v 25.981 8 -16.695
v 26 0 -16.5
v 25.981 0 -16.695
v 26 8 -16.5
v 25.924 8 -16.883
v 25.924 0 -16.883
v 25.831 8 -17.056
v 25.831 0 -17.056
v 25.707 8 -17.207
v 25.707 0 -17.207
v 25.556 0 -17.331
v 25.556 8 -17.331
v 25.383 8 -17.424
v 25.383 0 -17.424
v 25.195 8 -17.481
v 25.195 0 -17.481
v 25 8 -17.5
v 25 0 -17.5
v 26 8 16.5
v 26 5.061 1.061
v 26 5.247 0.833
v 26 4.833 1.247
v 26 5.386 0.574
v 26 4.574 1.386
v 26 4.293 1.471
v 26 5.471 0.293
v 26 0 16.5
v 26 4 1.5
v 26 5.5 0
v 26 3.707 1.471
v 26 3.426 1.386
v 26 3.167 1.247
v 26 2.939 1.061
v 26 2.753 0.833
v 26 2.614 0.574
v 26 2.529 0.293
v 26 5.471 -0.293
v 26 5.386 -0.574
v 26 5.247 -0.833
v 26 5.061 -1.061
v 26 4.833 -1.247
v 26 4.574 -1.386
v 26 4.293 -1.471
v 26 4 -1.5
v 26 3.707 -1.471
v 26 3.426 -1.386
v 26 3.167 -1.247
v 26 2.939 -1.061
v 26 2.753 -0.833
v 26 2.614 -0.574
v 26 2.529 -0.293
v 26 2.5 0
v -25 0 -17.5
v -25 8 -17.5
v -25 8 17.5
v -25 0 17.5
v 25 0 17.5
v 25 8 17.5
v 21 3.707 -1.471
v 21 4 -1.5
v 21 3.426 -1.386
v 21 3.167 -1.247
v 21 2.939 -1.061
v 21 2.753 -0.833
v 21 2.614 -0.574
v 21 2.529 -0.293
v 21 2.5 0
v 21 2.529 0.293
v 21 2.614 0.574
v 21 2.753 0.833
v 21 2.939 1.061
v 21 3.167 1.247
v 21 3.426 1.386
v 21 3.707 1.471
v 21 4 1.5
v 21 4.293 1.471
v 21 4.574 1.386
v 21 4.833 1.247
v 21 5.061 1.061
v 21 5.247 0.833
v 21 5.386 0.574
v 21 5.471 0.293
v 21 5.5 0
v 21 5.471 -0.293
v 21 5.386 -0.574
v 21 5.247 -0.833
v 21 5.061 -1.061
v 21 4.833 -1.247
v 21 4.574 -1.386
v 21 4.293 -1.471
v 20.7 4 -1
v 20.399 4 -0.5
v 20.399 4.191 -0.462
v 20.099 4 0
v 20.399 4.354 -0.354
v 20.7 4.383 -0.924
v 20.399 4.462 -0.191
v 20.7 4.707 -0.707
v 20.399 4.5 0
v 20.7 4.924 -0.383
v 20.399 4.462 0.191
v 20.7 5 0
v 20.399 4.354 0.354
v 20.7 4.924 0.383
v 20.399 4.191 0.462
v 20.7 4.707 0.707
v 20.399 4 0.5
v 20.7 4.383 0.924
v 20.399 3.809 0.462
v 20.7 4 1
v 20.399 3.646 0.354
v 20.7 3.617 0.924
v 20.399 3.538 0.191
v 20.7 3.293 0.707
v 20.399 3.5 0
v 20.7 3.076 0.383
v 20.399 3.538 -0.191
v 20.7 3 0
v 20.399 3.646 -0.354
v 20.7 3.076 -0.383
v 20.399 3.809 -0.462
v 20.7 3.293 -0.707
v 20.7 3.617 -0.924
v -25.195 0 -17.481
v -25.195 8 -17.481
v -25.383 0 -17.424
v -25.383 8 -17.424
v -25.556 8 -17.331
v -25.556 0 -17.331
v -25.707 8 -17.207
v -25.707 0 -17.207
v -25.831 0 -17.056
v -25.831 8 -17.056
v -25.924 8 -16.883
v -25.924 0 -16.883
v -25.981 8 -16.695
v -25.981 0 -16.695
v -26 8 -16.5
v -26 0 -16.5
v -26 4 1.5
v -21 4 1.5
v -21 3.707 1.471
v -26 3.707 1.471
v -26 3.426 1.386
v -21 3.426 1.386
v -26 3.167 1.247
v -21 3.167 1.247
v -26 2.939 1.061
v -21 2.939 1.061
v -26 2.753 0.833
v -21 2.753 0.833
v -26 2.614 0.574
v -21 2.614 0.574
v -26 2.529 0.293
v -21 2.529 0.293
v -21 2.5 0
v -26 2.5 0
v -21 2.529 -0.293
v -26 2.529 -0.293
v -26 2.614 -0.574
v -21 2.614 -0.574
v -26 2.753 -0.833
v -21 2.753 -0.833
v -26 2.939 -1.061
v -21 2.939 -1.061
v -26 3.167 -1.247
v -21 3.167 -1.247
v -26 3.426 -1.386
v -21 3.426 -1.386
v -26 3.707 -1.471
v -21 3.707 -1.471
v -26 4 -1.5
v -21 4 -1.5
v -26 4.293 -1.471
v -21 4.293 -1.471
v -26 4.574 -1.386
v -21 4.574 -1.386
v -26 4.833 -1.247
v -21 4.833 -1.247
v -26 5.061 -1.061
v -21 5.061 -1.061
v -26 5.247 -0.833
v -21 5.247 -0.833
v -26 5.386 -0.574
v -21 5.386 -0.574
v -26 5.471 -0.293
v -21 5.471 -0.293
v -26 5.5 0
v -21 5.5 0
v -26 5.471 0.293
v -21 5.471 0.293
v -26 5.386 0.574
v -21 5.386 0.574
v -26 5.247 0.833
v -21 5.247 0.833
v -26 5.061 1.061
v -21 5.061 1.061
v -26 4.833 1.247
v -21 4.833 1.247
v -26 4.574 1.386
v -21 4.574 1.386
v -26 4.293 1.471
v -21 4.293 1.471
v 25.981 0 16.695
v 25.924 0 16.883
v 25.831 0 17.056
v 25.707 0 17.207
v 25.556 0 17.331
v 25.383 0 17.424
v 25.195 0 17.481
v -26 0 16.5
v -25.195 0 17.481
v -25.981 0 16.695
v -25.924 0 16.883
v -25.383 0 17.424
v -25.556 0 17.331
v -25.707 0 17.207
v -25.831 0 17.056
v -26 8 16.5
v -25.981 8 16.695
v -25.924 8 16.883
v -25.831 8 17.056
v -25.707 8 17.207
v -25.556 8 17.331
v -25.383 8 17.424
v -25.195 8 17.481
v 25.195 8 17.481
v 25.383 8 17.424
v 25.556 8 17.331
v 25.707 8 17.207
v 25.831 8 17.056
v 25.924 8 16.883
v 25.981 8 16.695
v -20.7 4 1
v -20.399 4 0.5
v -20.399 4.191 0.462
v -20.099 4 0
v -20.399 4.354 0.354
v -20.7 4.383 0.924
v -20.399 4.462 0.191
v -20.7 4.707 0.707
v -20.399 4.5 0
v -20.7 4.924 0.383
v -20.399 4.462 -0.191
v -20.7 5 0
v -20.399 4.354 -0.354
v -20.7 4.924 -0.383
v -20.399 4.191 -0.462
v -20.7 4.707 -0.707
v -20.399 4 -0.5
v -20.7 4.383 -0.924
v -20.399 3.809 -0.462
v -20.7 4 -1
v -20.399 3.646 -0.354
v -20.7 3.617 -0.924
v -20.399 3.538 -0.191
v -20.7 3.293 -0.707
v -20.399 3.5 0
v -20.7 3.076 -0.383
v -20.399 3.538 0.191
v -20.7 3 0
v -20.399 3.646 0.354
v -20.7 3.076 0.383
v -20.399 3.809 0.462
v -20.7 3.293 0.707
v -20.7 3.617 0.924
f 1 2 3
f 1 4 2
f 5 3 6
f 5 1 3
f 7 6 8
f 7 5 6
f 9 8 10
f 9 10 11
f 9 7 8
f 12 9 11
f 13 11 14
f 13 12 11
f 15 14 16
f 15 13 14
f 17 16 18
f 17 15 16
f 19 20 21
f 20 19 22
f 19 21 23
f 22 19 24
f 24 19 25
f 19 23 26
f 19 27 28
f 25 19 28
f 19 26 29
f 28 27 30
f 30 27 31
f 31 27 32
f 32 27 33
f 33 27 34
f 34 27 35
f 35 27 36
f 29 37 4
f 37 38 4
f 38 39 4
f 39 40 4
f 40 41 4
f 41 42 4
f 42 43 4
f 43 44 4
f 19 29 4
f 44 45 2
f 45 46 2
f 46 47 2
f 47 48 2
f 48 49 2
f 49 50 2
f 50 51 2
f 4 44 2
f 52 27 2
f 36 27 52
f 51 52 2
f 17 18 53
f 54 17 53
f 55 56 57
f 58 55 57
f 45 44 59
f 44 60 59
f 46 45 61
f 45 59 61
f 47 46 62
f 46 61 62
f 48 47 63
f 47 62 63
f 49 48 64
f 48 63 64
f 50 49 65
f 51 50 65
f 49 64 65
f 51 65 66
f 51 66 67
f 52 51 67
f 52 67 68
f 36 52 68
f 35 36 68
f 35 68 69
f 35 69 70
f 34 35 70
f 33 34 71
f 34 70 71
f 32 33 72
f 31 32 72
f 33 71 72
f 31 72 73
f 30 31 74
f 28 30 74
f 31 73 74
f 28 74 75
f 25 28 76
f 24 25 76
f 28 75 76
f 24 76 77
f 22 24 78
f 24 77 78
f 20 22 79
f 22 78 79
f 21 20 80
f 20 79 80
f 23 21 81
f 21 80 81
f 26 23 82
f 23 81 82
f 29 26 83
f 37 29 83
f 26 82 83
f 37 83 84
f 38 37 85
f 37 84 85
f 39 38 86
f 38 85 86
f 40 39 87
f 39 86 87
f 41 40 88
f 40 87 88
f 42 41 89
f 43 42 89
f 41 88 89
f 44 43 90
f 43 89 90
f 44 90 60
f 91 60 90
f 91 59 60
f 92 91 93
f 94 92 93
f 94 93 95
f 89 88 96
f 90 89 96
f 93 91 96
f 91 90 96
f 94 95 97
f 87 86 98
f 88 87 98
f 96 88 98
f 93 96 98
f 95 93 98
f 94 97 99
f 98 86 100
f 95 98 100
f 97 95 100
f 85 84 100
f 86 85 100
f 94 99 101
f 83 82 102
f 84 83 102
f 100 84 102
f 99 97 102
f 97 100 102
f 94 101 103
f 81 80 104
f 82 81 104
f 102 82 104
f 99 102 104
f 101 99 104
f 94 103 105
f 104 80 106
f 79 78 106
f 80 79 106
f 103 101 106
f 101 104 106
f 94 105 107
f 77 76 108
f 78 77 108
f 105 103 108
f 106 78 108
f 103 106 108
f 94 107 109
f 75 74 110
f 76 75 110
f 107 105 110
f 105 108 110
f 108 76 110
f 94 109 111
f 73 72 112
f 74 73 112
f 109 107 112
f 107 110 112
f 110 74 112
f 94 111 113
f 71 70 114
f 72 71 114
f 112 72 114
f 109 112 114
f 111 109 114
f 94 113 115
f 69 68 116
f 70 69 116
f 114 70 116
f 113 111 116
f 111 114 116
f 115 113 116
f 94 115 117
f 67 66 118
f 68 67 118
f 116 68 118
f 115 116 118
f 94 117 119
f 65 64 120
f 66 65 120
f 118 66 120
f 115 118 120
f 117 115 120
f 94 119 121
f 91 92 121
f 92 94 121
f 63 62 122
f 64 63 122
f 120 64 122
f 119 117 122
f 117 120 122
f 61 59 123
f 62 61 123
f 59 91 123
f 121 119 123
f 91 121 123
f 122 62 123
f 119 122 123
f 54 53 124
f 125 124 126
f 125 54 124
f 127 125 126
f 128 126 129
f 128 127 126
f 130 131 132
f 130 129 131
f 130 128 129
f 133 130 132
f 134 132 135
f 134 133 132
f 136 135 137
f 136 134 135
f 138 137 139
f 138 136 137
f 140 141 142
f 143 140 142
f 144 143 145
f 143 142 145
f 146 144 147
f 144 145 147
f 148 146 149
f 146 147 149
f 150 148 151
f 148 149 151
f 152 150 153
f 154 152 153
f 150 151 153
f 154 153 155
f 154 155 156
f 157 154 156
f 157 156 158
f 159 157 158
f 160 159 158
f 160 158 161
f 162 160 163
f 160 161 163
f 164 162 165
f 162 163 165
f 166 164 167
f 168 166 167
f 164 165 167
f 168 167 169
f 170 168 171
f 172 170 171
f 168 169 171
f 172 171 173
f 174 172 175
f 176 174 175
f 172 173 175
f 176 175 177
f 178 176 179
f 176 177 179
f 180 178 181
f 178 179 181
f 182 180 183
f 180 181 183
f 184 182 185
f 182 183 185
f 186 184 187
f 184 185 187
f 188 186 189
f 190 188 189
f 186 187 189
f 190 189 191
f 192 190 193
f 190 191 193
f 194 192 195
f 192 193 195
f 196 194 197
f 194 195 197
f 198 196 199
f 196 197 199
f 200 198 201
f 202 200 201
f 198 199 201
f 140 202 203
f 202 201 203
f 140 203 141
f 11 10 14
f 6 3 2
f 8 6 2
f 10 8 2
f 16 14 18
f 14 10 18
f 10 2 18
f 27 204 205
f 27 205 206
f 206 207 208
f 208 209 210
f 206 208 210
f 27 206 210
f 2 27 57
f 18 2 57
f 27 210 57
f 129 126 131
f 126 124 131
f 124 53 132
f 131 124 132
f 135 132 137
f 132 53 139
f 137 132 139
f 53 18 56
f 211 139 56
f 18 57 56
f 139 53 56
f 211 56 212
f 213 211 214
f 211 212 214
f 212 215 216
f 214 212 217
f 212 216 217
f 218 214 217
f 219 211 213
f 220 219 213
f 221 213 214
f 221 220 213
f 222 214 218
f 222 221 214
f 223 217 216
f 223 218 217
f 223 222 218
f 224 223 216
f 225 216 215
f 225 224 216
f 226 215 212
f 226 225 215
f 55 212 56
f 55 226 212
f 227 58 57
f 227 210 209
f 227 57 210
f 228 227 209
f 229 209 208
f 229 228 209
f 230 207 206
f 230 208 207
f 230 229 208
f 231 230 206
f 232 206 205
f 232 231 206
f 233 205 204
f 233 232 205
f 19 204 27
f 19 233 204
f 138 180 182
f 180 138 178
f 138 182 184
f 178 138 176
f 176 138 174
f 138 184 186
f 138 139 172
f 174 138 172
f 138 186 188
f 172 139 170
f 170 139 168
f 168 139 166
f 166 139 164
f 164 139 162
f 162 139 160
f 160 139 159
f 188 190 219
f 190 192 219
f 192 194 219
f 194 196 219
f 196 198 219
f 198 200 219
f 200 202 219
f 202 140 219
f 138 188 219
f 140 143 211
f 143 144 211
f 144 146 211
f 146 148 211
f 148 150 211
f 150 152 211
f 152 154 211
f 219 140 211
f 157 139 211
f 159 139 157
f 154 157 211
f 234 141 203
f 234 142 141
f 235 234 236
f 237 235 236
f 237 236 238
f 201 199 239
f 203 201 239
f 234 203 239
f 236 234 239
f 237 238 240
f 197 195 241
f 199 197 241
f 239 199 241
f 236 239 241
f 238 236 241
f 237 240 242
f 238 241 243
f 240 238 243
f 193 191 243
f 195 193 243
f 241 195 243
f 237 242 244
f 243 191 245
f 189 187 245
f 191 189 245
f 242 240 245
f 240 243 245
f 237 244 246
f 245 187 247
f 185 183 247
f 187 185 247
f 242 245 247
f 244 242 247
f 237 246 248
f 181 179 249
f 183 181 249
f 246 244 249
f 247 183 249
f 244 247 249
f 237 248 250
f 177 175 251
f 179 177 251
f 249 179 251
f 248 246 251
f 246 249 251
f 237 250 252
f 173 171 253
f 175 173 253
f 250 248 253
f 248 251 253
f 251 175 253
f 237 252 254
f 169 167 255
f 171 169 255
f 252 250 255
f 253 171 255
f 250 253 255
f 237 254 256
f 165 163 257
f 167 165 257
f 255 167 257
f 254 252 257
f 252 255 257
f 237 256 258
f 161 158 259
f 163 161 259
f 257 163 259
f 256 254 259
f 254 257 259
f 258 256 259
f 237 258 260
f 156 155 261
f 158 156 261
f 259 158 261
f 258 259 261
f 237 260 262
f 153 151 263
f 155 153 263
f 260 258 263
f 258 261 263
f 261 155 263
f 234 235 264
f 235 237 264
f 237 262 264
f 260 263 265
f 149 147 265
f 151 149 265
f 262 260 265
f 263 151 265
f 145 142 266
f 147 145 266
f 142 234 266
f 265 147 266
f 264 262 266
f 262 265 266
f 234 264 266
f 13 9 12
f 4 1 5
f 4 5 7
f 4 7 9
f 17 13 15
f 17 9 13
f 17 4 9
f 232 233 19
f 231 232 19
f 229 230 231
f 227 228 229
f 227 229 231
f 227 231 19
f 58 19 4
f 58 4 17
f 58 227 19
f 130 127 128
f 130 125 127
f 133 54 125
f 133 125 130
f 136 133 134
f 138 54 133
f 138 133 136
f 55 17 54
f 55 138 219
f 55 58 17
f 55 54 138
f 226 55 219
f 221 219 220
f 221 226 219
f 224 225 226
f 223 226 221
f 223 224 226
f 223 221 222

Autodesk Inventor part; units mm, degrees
ref_plane "YZ Plane" through (0, 0, 0) normal (1, 0, 0) x (0, 1, 0)
ref_plane "XZ Plane" through (0, 0, 0) normal (0, 1, 0) x (-1, 0, 0)
ref_plane "XY Plane" through (0, 0, 0) normal (0, 0, 1) x (1, 0, 0)
sketch "Esboço1" plane through (0, 0, 0) normal (0, 1, 0) x (-1, 0, 0)
  line L0 (-26, -17.5) -> (26, -17.5)
  line L1 (26, -17.5) -> (26, 17.5)
  line L2 (26, 17.5) -> (-26, 17.5)
  line L3 (-26, 17.5) -> (-26, -17.5)
  line L4 (-26, -17.5) -> (26, 17.5) construction
  line L5 (26, -17.5) -> (-26, 17.5) construction
  point P0 (0, 0)
  dimension "d0" = 52
  dimension "d1" = 35
extrude "Extrusão1" add sketch "Esboço1" along normal blind 8
fillet "Arredondamento1" radius 1 4 edges at (26, 4, -17.5) (-26, 4, -17.5) (26, 4, 17.5) (-26, 4, 17.5)
sketch "Esboço2" plane through (-26, 0, -16.5) normal (-1, 0, 0) x (0, 0, 1)
  line L0 (0, 8) -> (33, 8) projected
  line L1 (0, 0) -> (33, 0) projected
  point P0 (16.5, 0)
  point P1 (16.5, 4)
  point P2 (16.5, 0)
  dimension "d5" = 4
hole "Furo1" at (-26, 4, 0) direction (1, 0, 0) diameter 3 depth 5 tip angle 118
sketch "Esboço3" plane through (26, 0, 16.5) normal (1, 0, 0) x (0, 0, -1)
  line L0 (0, 8) -> (33, 8) projected
  line L1 (0, 0) -> (33, 0) projected
  point P0 (16.5, 0)
  point P1 (16.5, 4)
  point P2 (16.5, 0)
  dimension "d13" = 4
hole "Furo2" at (26, 4, 0) direction (-1, 0, 0) diameter 3 depth 5 tip angle 118
properties part number "Case - Tampa" material "Plástico PC/ABS"
